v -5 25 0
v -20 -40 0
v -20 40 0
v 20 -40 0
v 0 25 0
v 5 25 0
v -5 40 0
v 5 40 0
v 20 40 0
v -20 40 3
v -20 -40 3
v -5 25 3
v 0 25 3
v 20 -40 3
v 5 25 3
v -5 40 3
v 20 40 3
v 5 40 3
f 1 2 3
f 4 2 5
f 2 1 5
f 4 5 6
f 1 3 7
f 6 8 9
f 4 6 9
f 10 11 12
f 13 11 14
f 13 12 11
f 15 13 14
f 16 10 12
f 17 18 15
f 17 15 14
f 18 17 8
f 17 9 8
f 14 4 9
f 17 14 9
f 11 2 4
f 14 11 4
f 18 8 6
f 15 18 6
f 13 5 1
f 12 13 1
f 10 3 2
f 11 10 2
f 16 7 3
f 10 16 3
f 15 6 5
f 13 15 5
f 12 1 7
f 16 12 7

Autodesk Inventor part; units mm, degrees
ref_plane "YZ Plane" through (0, 0, 0) normal (1, 0, 0) x (0, 1, 0)
ref_plane "XZ Plane" through (0, 0, 0) normal (0, 1, 0) x (-1, 0, 0)
ref_plane "XY Plane" through (0, 0, 0) normal (0, 0, 1) x (1, 0, 0)
sketch "Sketch1" plane through (0, 0, 0) normal (0, 0, 1) x (1, 0, 0)
  line L0 (-20, -40) -> (20, -40)
  line L1 (20, -40) -> (20, 40)
  line L2 (20, 40) -> (-20, 40)
  line L3 (-20, 40) -> (-20, -40)
  line L4 (-20, -40) -> (20, 40) construction
  line L5 (20, -40) -> (-20, 40) construction
  line L6 (-5, 40) -> (5, 40)
  line L7 (5, 40) -> (5, 25)
  line L8 (5, 25) -> (-5, 25)
  line L9 (-5, 25) -> (-5, 40)
  line L10 (0, 40) -> (0, 0)
  dimension "d0" = 40
  dimension "d1" = 80
  dimension "d2" = 15
  dimension "d3" = 10
extrude "Plate1" add sketch "Sketch1" along normal blind 3 contours L3 L2 L9 L8 L7 L1 L0
equation "\"d4\" = Thickness"
equation "\"BendRadius\" = Thickness"
equation "\"BendReliefWidth\" = Thickness"
equation "\"BendReliefDepth\" = 0.5 * Thickness"
equation "\"CornerReliefSize\" = 4 * Thickness"
equation "\"MinimumRemnant\" = 2 * Thickness"
equation "\"TransitionRadius\" = BendRadius"
equation "\"JacobiRadiusSize\" = BendRadius"
equation "\"GapSize\" = Thickness"
equation "\"Thickness\" = 3"
properties part number "ramp extension"
